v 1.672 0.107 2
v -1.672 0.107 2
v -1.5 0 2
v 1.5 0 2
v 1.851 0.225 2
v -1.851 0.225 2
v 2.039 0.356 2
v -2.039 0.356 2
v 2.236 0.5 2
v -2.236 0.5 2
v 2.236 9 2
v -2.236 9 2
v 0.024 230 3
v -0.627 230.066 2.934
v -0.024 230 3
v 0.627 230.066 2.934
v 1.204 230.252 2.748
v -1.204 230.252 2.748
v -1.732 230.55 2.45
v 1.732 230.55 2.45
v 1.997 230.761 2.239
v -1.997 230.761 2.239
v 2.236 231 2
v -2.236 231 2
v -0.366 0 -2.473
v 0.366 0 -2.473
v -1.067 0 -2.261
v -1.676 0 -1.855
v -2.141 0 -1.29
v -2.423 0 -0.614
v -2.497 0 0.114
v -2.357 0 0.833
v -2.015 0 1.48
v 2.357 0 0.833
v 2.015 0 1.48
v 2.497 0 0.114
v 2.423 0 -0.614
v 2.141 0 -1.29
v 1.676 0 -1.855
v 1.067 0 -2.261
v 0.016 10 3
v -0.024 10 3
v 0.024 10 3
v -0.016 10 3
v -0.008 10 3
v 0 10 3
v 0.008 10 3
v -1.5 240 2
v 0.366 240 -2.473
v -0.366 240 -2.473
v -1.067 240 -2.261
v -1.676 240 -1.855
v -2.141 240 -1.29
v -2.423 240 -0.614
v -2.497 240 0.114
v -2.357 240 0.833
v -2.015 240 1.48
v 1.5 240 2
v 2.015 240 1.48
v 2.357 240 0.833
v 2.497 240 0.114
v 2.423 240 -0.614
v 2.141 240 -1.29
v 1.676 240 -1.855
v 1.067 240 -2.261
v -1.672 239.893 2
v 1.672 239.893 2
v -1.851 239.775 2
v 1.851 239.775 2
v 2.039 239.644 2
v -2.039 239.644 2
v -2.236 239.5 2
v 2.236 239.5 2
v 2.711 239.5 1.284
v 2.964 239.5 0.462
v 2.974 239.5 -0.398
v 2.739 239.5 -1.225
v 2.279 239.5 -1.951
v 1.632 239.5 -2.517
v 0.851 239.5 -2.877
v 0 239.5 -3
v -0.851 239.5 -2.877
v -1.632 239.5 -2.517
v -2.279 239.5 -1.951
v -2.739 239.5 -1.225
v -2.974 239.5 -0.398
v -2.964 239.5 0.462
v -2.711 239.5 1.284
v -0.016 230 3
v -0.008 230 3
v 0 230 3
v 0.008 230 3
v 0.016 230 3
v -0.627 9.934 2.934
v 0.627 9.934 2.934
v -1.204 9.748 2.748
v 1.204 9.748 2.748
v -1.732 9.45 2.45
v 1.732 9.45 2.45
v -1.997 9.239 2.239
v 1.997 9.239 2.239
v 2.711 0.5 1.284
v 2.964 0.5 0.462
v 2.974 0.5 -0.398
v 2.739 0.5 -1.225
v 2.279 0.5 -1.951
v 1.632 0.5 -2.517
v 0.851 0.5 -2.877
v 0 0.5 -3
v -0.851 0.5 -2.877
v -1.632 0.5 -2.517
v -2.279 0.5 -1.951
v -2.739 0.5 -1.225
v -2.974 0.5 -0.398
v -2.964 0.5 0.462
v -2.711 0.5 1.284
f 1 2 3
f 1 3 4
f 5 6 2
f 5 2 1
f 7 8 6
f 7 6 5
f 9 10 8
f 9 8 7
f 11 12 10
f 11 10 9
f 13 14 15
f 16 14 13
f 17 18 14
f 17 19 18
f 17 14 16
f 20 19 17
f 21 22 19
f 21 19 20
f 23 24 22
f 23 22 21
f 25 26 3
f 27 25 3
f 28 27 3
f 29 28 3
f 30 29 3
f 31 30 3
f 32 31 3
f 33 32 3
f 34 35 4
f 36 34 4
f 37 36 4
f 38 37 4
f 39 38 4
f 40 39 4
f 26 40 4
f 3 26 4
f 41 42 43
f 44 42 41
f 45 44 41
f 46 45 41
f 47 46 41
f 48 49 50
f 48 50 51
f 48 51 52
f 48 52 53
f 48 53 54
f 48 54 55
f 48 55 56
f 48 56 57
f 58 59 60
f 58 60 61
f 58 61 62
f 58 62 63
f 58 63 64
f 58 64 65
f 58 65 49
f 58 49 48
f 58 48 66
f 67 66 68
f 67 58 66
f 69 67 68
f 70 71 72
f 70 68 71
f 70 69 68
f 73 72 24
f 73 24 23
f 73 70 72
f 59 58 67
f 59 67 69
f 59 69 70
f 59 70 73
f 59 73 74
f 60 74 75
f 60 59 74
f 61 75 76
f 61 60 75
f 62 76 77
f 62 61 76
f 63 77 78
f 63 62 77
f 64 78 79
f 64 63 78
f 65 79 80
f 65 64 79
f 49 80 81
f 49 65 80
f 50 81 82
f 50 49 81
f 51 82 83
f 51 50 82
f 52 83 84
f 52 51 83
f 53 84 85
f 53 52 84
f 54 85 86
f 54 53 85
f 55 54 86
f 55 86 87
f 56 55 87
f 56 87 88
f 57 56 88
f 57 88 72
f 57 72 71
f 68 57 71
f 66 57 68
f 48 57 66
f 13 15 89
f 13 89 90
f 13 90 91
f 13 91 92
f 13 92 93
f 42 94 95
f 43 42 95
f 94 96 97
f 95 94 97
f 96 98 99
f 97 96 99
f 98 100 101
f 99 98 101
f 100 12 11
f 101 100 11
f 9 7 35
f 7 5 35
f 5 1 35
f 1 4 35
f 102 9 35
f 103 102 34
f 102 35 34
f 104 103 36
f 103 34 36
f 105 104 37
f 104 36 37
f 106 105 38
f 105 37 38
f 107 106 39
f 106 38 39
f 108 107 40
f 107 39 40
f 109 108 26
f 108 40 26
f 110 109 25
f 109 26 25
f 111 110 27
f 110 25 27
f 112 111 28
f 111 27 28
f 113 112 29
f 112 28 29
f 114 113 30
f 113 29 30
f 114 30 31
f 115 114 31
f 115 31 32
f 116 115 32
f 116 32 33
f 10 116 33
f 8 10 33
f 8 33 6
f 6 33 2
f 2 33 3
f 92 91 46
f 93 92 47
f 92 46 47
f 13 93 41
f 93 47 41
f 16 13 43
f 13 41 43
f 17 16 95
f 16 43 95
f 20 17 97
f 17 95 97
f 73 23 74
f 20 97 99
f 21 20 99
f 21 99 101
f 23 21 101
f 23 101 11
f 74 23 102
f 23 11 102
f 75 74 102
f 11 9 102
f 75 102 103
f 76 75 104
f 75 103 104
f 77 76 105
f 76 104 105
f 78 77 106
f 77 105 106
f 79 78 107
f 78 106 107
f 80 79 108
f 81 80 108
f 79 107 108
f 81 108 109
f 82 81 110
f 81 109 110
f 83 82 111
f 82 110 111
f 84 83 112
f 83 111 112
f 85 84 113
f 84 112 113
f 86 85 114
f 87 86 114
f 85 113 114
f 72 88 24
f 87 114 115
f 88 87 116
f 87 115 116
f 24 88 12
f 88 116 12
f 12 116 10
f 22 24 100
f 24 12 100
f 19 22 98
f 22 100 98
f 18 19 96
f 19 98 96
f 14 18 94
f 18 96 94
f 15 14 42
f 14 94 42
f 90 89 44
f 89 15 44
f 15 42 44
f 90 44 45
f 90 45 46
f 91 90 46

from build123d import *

# Parameters (mm, degrees)
SKIZZE1_R                       = 3
AUFSATZ_LINEAR_AUSTRAGEN1_DEPTH = 240
FASE2_SIZE                      = 0.5
SCHNITT_LINEAR_START            = 2
SKIZZE2_W                       = 6
SKIZZE2_H                       = 10
SCHNITT_LINEAR_AUSTRAGEN1_DEPTH = 239.037497071
FASE1_SIZE                      = 1


with BuildPart() as part:
    # Skizze1 → Aufsatz-Linear austragen1 (new body)
    with BuildSketch(Plane(origin=(0, 0, 0), x_dir=(1, 0, 0), z_dir=(0, 1, 0))):
        with Locations(Location((0, 0, 0), (0, 0, 270))):
            Circle(SKIZZE1_R)
    extrude(amount=AUFSATZ_LINEAR_AUSTRAGEN1_DEPTH)

    # Fase2
    fase2_edges = [part.edges().sort_by_distance(p)[0] for p in [
        (0, 0, -3),
        (0, 240, -3),
    ]]
    chamfer(fase2_edges, length=FASE2_SIZE)

    # Skizze2 → Schnitt-Linear austragen1 (cut, through all)
    with BuildSketch(Plane.XY.offset(SCHNITT_LINEAR_START)):
        with Locations((0, 235)):
            Rectangle(SKIZZE2_W, SKIZZE2_H)
        with Locations((0, 5)):
            Rectangle(SKIZZE2_W, SKIZZE2_H)
    extrude(amount=SCHNITT_LINEAR_AUSTRAGEN1_DEPTH, mode=Mode.SUBTRACT)

    # Fase1
    fase1_edges = [part.edges().sort_by_distance(p)[0] for p in [
        (0, 230, 2),
        (0, 10, 2),
    ]]
    chamfer(fase1_edges, length=FASE1_SIZE - 0.0001)  # a hair under: the kernel refuses the full size


solid = part.part
